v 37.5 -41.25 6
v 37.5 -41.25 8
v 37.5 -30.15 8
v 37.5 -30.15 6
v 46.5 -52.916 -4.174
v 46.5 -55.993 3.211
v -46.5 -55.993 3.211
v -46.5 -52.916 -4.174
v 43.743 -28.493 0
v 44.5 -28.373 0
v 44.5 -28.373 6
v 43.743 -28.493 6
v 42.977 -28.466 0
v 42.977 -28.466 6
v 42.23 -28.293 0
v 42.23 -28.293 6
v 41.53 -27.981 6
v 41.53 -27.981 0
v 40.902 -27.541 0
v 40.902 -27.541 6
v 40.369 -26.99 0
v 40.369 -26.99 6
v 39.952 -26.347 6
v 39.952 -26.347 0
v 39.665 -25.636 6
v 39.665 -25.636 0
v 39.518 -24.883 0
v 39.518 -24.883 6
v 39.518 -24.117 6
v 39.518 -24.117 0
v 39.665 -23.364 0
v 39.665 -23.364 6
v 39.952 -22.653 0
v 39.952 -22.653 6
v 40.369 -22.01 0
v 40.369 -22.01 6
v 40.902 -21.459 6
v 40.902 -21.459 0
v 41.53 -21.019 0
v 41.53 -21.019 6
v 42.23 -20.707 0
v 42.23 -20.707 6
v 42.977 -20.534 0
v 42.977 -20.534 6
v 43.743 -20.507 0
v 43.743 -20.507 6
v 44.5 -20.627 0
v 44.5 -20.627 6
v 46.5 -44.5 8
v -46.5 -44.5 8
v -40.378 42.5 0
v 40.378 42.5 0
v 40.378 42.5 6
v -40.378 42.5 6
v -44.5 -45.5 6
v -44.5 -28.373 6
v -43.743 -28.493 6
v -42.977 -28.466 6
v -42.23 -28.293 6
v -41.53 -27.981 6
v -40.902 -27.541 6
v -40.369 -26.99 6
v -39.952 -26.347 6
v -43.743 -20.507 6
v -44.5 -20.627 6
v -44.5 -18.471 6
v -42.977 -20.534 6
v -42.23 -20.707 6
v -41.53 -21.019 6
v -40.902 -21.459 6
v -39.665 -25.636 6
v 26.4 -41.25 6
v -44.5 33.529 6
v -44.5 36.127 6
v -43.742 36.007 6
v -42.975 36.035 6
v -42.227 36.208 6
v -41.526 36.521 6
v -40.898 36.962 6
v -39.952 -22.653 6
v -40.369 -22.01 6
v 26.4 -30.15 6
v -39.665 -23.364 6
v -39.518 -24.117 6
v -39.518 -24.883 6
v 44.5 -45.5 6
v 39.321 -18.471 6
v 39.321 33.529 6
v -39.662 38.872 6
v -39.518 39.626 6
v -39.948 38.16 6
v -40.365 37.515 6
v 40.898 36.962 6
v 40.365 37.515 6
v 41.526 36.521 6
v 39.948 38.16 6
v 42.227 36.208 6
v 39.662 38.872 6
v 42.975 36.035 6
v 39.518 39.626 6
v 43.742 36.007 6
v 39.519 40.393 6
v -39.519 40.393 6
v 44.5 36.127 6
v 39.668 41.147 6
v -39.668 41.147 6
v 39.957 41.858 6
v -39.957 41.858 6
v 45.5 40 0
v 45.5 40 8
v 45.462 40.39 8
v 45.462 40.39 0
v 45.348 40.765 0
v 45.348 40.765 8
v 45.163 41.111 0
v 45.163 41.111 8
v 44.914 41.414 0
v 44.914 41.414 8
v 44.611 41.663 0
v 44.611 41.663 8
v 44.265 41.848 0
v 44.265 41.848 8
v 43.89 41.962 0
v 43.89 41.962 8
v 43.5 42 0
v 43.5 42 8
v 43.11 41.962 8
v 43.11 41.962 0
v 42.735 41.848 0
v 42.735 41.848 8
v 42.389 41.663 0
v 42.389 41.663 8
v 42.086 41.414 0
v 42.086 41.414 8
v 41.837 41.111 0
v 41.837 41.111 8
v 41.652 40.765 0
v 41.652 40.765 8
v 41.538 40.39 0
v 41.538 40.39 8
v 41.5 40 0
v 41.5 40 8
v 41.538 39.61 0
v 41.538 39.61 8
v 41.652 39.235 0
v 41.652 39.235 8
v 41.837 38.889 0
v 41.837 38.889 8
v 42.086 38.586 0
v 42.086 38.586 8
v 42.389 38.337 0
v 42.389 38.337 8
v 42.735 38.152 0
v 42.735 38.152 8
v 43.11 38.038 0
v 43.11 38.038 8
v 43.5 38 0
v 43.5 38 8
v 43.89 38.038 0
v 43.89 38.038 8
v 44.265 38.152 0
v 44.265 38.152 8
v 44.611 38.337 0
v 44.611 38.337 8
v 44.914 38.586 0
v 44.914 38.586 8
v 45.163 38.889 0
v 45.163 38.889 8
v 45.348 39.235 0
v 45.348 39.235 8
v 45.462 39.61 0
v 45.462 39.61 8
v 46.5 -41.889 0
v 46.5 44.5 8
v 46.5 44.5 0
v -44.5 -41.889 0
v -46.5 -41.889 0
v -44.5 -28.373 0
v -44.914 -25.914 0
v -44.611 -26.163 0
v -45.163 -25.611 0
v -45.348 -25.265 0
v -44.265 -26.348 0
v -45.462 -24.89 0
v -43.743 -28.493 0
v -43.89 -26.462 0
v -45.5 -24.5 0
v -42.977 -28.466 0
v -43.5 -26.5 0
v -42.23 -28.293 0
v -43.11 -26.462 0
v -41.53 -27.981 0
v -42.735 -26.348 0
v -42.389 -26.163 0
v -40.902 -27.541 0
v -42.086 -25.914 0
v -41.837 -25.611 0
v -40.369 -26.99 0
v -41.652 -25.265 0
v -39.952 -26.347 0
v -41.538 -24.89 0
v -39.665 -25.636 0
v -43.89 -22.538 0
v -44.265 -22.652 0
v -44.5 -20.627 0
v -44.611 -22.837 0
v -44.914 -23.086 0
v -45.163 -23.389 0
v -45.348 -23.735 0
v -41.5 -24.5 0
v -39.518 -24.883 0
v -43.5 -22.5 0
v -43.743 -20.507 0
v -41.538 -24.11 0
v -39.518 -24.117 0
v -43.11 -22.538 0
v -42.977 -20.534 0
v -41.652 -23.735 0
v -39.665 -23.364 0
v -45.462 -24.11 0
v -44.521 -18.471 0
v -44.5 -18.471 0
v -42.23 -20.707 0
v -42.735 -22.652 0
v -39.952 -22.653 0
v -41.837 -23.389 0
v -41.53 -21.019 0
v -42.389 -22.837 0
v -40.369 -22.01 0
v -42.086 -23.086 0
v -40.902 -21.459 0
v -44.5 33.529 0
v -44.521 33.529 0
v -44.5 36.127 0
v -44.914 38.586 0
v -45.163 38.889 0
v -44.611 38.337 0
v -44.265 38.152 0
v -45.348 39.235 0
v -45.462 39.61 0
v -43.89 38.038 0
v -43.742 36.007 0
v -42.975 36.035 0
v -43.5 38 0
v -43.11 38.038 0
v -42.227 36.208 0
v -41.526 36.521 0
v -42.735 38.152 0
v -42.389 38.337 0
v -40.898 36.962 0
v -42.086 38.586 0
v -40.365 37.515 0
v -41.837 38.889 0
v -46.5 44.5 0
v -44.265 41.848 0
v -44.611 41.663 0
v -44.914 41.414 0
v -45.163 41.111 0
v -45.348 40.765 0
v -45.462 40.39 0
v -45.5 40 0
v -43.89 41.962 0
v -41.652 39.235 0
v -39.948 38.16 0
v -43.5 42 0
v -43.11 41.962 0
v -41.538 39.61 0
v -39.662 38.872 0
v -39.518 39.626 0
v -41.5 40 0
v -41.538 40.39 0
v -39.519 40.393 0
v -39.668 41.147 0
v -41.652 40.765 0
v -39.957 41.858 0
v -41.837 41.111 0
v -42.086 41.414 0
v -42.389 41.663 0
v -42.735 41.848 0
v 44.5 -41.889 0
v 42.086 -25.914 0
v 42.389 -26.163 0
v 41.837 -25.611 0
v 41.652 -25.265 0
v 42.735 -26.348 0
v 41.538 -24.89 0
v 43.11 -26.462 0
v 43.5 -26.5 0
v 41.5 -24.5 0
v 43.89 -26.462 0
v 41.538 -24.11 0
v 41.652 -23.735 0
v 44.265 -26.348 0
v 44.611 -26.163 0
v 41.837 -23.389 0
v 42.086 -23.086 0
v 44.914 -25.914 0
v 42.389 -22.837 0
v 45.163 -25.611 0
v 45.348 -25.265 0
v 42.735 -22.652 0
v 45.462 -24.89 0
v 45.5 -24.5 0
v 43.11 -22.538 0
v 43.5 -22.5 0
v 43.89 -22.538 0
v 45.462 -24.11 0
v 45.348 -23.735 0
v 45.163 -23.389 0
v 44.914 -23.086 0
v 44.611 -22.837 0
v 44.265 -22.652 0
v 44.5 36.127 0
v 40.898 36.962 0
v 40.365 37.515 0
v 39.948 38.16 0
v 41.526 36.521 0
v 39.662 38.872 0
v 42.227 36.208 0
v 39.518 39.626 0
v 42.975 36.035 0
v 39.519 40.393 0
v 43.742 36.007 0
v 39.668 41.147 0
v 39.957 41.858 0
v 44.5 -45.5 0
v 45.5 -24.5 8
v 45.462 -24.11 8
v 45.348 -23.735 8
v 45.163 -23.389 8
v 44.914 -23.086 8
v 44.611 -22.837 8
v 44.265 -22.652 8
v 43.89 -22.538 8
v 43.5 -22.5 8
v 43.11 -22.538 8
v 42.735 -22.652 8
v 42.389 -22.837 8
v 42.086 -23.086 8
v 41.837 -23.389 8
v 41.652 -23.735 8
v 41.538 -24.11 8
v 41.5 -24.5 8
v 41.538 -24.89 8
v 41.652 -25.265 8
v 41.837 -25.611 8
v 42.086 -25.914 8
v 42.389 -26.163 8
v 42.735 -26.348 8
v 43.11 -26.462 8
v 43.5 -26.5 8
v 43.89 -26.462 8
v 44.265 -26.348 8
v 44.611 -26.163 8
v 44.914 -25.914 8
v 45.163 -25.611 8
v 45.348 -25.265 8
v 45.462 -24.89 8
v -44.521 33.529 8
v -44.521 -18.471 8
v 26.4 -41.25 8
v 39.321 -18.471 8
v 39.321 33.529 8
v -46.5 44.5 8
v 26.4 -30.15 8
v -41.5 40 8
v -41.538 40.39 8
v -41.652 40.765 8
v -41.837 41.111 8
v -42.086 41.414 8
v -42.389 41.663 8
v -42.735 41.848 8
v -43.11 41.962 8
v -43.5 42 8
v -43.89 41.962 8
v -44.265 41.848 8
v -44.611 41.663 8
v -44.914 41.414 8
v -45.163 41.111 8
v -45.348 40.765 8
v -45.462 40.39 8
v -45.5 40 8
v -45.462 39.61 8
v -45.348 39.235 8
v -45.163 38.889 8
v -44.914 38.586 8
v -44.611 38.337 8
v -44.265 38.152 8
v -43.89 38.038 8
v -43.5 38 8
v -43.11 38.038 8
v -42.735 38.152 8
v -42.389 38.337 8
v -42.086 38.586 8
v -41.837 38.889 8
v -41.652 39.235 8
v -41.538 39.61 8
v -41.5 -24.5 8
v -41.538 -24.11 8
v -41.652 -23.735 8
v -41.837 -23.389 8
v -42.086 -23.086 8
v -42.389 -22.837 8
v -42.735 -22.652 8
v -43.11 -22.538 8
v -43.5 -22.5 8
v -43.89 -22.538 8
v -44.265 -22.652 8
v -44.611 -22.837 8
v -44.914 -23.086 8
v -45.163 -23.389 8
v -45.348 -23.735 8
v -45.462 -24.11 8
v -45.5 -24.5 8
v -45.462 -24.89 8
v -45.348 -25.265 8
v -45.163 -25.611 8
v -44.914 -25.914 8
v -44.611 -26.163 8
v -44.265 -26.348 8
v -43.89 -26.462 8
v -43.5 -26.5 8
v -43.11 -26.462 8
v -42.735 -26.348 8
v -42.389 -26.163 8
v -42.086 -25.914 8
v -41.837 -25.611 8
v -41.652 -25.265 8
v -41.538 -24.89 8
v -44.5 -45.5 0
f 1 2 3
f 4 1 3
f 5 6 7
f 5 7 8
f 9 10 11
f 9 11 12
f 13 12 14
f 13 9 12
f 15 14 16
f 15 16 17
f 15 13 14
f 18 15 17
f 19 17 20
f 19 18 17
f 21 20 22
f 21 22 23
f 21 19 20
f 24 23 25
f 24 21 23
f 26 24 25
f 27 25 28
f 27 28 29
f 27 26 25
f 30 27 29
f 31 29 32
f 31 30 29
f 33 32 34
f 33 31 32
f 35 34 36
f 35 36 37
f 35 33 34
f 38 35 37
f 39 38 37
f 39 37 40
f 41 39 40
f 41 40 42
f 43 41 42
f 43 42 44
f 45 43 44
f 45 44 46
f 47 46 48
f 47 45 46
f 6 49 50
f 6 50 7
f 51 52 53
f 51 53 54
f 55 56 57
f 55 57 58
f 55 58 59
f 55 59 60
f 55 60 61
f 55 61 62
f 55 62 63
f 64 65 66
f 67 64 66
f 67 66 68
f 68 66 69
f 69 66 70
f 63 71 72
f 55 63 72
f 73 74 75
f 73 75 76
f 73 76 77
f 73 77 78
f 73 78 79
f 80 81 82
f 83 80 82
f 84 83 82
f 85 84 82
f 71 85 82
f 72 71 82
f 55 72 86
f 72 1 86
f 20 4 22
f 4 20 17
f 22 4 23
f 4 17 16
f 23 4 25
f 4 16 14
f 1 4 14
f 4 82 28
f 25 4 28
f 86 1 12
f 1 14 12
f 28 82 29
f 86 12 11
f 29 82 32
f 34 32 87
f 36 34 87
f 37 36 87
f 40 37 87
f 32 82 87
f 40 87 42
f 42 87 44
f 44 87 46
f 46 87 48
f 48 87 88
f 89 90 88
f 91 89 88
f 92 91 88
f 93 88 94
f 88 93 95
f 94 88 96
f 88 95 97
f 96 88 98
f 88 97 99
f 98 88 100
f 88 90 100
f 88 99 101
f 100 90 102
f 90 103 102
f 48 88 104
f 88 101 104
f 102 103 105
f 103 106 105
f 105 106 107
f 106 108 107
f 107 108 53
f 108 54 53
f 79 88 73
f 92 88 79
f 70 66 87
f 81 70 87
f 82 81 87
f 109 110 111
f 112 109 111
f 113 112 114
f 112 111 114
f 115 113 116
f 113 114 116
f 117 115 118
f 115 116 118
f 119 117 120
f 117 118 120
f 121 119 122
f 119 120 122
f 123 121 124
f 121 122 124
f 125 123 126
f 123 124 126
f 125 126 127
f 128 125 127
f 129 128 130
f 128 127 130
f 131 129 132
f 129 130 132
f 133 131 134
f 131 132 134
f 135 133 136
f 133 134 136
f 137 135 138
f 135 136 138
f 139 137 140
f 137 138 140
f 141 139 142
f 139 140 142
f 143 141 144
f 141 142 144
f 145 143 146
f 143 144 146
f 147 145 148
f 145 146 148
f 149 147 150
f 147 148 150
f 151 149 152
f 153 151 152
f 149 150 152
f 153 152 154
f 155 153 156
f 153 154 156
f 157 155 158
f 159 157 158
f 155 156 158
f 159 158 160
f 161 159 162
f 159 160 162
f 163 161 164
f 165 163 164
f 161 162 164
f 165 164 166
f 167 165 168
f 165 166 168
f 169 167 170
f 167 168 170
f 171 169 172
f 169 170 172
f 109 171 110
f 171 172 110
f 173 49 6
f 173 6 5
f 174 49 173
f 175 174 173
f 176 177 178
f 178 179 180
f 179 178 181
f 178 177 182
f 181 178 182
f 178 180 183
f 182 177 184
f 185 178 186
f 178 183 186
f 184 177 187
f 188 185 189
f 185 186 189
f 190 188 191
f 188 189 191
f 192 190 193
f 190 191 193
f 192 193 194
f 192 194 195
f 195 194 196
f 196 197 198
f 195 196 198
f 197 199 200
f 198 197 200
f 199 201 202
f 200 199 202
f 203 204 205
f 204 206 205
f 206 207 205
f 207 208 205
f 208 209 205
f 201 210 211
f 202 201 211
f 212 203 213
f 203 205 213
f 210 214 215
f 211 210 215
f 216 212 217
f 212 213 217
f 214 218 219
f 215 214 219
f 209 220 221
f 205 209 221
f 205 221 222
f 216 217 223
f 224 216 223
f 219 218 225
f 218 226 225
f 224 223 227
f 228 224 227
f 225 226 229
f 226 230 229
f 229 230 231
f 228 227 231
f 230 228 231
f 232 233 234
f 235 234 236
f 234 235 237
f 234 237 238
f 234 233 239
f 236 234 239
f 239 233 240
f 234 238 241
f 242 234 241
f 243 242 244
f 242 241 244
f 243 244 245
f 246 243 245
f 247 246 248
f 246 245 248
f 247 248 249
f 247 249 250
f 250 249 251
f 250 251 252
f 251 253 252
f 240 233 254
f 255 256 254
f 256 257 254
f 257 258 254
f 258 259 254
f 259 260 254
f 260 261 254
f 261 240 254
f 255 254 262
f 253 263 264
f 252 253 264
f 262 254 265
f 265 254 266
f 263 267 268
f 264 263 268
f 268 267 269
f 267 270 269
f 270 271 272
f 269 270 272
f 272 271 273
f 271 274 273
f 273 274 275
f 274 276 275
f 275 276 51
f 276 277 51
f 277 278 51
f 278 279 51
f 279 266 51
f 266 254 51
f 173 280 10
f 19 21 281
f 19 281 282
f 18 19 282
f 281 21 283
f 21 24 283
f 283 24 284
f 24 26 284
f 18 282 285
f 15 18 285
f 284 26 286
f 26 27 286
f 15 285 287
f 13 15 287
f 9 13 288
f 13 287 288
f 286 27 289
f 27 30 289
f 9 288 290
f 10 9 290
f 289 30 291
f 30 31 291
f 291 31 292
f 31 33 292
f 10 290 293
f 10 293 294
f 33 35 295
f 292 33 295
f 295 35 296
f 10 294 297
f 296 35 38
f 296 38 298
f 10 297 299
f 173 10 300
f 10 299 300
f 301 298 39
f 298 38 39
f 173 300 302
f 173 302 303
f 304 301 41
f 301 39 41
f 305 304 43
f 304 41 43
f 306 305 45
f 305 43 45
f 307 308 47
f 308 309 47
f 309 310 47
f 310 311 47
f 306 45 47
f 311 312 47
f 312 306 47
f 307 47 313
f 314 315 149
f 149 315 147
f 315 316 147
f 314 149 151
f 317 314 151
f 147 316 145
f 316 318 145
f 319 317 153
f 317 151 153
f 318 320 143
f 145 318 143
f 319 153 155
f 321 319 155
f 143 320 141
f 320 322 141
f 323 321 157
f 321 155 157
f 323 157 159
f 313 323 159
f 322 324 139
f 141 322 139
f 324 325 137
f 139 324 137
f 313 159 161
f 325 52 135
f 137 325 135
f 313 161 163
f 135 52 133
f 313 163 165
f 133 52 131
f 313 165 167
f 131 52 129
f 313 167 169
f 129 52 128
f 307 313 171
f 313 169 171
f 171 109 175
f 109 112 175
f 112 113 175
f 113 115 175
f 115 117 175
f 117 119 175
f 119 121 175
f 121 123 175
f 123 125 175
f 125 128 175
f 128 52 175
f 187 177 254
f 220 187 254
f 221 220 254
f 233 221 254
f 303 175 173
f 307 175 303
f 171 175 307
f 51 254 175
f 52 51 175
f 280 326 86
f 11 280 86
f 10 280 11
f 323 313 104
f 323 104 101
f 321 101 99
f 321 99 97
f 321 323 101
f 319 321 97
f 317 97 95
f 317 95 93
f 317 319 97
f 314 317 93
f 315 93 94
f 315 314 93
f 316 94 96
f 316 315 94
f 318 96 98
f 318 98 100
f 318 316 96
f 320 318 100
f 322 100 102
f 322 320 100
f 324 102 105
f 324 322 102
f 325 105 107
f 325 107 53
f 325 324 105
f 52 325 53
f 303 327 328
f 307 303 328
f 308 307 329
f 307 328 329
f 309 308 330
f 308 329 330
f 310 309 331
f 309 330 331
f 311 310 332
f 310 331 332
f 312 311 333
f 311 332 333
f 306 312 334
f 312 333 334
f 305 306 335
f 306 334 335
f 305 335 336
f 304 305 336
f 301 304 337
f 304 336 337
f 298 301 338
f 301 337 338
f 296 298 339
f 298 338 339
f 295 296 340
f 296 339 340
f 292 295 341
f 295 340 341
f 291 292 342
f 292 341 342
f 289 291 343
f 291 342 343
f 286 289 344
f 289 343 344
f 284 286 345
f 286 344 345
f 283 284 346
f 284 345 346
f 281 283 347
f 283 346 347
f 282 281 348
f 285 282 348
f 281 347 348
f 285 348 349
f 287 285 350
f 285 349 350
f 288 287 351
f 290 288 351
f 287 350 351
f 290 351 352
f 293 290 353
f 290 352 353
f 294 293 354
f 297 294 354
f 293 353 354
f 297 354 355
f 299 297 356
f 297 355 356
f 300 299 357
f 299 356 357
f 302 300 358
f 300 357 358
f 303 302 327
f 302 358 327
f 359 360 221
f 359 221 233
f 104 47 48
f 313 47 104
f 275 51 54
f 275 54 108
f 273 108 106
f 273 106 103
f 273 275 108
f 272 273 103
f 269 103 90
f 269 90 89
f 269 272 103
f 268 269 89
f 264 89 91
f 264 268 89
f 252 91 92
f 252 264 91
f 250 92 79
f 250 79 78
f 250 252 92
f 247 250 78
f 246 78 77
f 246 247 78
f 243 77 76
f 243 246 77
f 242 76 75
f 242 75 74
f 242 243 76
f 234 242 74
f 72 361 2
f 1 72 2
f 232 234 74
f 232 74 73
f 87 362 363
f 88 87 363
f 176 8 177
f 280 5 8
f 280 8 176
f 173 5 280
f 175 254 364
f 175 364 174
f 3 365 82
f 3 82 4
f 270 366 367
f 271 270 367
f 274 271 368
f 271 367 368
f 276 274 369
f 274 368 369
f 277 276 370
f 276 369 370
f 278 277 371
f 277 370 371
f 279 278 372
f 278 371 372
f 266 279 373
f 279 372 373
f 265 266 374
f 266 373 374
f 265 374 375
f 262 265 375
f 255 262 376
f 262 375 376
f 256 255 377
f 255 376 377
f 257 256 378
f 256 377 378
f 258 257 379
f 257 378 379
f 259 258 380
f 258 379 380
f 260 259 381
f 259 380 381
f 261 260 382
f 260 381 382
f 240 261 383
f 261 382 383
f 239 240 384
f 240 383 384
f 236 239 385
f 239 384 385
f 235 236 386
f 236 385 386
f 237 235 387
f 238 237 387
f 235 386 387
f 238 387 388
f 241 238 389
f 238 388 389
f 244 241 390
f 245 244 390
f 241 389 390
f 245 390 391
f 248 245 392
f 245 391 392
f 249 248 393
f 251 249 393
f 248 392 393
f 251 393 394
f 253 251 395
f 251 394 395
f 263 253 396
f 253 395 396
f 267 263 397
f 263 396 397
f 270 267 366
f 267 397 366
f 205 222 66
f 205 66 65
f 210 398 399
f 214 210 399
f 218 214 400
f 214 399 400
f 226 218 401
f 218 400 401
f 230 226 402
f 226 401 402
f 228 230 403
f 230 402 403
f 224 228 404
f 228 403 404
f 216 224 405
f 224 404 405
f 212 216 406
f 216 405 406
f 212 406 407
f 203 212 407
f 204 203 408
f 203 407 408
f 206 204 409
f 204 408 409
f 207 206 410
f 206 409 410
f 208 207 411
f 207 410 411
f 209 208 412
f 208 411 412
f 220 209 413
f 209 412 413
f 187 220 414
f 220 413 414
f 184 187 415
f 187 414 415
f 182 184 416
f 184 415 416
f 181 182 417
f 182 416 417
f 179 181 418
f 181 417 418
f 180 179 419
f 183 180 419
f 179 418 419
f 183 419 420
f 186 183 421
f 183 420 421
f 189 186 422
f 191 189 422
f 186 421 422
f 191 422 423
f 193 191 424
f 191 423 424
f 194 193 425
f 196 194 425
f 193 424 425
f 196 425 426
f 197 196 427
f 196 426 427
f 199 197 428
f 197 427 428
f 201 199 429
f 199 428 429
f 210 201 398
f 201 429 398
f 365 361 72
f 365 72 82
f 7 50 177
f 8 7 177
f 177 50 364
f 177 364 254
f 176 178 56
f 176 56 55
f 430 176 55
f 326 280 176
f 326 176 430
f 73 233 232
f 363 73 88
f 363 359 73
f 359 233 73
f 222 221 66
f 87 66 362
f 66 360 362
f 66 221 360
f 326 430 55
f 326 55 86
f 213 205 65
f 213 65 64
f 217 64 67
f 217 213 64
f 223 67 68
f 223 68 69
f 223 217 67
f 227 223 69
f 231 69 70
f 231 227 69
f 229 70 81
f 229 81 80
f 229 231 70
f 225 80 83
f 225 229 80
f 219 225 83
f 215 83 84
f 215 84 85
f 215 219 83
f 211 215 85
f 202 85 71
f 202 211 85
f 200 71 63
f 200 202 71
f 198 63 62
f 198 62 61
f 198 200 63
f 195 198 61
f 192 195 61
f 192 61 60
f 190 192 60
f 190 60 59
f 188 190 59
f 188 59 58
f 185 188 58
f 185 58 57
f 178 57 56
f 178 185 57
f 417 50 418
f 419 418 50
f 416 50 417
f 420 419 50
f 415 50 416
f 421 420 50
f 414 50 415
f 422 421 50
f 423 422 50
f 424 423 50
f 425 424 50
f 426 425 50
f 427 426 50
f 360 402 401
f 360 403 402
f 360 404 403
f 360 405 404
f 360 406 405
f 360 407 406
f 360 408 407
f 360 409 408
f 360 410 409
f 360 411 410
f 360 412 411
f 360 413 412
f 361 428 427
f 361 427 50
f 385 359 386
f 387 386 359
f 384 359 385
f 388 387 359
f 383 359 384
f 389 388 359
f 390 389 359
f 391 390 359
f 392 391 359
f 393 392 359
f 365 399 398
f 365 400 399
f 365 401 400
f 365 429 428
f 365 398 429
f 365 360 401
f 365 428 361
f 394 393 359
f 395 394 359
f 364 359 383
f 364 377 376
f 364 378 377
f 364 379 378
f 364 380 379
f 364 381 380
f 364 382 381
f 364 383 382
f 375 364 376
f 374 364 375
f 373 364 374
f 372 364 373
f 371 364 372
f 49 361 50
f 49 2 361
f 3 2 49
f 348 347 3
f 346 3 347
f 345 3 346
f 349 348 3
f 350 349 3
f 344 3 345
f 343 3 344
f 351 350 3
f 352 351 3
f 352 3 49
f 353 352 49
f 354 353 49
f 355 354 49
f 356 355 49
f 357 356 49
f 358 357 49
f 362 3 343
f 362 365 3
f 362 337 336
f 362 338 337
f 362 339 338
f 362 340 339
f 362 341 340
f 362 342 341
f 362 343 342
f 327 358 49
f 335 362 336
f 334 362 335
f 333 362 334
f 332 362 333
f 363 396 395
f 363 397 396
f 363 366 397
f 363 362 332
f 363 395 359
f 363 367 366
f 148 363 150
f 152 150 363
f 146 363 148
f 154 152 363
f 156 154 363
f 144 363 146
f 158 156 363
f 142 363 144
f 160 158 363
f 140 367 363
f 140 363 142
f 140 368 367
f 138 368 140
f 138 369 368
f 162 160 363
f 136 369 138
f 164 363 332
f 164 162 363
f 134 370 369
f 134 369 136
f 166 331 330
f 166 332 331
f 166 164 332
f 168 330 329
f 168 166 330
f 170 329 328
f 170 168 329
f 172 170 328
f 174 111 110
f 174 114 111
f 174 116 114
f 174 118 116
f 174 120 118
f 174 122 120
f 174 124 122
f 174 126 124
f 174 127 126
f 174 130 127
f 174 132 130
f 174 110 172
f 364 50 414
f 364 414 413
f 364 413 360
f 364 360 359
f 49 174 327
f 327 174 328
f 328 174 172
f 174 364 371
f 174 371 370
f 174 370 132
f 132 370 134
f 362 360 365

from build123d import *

# Parameters (mm, degrees)
SKETCH1_W           = 93
SKETCH1_H           = 89
BOSS_EXTRUDE1_DEPTH = 8
SKETCH2_R           = 2
SKETCH2_W           = 83.842374854
SKETCH2_H           = 52
SKETCH2_W_2         = 11.1
SKETCH2_H_2         = 11.1
CUT_EXTRUDE1_DEPTH  = 8
SHELL6_OUTLINE_W    = 11.1
SHELL6_OUTLINE_H    = 11.1
SHELL6_DEPTH        = 6
BOSS_EXTRUDE2_DEPTH = 93
SKETCH4_W           = 89
SKETCH4_H           = 6
CUT_EXTRUDE2_DEPTH  = 3


# Read off the part's stored shape, not the designer's step: Shell6
with BuildPart() as part:
    # Sketch1 → Boss-Extrude1 (new body)
    with BuildSketch(Plane.XY):
        Rectangle(SKETCH1_W, SKETCH1_H)
    extrude(amount=BOSS_EXTRUDE1_DEPTH)

    # Sketch2 → Cut-Extrude1 (cut)
    with BuildSketch(Plane.XY.offset(8)):
        with Locations((-43.5, 40)):
            Circle(SKETCH2_R)
        with Locations((43.5, 40)):
            Circle(SKETCH2_R)
        with Locations((-43.5, -24.5)):
            Circle(SKETCH2_R)
        with Locations((43.5, -24.5)):
            Circle(SKETCH2_R)
        with Locations((-2.599934873, 7.528756998)):
            Rectangle(SKETCH2_W, SKETCH2_H)
        with Locations((31.95, -35.7)):
            Rectangle(SKETCH2_W_2, SKETCH2_H_2)
    extrude(amount=-CUT_EXTRUDE1_DEPTH, mode=Mode.SUBTRACT)

    # Shell6 outline → Shell6 (cut)
    with BuildSketch(Plane.XY):
        with BuildLine():
            Line((-44.5, -18.471243002), (-44.5, -20.627016654))
            ThreePointArc((-44.5, -20.627016654), (-39.5, -24.5), (-44.5, -28.372983346))
            Line((-44.5, -28.372983346), (-44.5, -42.5))
            Line((-44.5, -42.5), (44.5, -42.5))
            Line((44.5, -42.5), (44.5, -28.372983346))
            ThreePointArc((44.5, -28.372983346), (39.5, -24.5), (44.5, -20.627016654))
            Line((44.5, -20.627016654), (44.5, 36.127016654))
            ThreePointArc((44.5, 36.127016654), (40.1414319, 37.827439226), (40.377501001, 42.5))
            Line((40.377501001, 42.5), (-40.377501001, 42.5))
            ThreePointArc((-40.377501001, 42.5), (-40.1414319, 37.827439226), (-44.5, 36.127016654))
            Line((-44.5, 36.127016654), (-44.5, 33.528756998))
            Line((-44.5, 33.528756998), (39.321252554, 33.528756998))
            Line((39.321252554, 33.528756998), (39.321252554, -18.471243002))
            Line((39.321252554, -18.471243002), (-44.5, -18.471243002))
        make_face()
        with Locations((31.95, -35.7)):
            Rectangle(SHELL6_OUTLINE_W, SHELL6_OUTLINE_H, mode=Mode.SUBTRACT)
    extrude(amount=SHELL6_DEPTH, mode=Mode.SUBTRACT)

    # Sketch3 → Boss-Extrude2 (add)
    with BuildSketch(Plane(origin=(46.5, 0, 0), x_dir=(0, 0, -1), z_dir=(1, 0, 0))):
        Polygon((-8, -44.5), (-3.210722285, -55.992973734), (4.173770218, -52.915755757), (0, -41.888855003), (0, -44.5), align=None)
    extrude(amount=-BOSS_EXTRUDE2_DEPTH)

    # Sketch4 → Cut-Extrude2 (cut)
    with BuildSketch(Plane(origin=(0, -42.5, 0), x_dir=(1, 0, 0), z_dir=(0, 1, 0))):
        with Locations((0, -3)):
            Rectangle(SKETCH4_W, SKETCH4_H)
    extrude(amount=-CUT_EXTRUDE2_DEPTH, mode=Mode.SUBTRACT)


solid = part.part
